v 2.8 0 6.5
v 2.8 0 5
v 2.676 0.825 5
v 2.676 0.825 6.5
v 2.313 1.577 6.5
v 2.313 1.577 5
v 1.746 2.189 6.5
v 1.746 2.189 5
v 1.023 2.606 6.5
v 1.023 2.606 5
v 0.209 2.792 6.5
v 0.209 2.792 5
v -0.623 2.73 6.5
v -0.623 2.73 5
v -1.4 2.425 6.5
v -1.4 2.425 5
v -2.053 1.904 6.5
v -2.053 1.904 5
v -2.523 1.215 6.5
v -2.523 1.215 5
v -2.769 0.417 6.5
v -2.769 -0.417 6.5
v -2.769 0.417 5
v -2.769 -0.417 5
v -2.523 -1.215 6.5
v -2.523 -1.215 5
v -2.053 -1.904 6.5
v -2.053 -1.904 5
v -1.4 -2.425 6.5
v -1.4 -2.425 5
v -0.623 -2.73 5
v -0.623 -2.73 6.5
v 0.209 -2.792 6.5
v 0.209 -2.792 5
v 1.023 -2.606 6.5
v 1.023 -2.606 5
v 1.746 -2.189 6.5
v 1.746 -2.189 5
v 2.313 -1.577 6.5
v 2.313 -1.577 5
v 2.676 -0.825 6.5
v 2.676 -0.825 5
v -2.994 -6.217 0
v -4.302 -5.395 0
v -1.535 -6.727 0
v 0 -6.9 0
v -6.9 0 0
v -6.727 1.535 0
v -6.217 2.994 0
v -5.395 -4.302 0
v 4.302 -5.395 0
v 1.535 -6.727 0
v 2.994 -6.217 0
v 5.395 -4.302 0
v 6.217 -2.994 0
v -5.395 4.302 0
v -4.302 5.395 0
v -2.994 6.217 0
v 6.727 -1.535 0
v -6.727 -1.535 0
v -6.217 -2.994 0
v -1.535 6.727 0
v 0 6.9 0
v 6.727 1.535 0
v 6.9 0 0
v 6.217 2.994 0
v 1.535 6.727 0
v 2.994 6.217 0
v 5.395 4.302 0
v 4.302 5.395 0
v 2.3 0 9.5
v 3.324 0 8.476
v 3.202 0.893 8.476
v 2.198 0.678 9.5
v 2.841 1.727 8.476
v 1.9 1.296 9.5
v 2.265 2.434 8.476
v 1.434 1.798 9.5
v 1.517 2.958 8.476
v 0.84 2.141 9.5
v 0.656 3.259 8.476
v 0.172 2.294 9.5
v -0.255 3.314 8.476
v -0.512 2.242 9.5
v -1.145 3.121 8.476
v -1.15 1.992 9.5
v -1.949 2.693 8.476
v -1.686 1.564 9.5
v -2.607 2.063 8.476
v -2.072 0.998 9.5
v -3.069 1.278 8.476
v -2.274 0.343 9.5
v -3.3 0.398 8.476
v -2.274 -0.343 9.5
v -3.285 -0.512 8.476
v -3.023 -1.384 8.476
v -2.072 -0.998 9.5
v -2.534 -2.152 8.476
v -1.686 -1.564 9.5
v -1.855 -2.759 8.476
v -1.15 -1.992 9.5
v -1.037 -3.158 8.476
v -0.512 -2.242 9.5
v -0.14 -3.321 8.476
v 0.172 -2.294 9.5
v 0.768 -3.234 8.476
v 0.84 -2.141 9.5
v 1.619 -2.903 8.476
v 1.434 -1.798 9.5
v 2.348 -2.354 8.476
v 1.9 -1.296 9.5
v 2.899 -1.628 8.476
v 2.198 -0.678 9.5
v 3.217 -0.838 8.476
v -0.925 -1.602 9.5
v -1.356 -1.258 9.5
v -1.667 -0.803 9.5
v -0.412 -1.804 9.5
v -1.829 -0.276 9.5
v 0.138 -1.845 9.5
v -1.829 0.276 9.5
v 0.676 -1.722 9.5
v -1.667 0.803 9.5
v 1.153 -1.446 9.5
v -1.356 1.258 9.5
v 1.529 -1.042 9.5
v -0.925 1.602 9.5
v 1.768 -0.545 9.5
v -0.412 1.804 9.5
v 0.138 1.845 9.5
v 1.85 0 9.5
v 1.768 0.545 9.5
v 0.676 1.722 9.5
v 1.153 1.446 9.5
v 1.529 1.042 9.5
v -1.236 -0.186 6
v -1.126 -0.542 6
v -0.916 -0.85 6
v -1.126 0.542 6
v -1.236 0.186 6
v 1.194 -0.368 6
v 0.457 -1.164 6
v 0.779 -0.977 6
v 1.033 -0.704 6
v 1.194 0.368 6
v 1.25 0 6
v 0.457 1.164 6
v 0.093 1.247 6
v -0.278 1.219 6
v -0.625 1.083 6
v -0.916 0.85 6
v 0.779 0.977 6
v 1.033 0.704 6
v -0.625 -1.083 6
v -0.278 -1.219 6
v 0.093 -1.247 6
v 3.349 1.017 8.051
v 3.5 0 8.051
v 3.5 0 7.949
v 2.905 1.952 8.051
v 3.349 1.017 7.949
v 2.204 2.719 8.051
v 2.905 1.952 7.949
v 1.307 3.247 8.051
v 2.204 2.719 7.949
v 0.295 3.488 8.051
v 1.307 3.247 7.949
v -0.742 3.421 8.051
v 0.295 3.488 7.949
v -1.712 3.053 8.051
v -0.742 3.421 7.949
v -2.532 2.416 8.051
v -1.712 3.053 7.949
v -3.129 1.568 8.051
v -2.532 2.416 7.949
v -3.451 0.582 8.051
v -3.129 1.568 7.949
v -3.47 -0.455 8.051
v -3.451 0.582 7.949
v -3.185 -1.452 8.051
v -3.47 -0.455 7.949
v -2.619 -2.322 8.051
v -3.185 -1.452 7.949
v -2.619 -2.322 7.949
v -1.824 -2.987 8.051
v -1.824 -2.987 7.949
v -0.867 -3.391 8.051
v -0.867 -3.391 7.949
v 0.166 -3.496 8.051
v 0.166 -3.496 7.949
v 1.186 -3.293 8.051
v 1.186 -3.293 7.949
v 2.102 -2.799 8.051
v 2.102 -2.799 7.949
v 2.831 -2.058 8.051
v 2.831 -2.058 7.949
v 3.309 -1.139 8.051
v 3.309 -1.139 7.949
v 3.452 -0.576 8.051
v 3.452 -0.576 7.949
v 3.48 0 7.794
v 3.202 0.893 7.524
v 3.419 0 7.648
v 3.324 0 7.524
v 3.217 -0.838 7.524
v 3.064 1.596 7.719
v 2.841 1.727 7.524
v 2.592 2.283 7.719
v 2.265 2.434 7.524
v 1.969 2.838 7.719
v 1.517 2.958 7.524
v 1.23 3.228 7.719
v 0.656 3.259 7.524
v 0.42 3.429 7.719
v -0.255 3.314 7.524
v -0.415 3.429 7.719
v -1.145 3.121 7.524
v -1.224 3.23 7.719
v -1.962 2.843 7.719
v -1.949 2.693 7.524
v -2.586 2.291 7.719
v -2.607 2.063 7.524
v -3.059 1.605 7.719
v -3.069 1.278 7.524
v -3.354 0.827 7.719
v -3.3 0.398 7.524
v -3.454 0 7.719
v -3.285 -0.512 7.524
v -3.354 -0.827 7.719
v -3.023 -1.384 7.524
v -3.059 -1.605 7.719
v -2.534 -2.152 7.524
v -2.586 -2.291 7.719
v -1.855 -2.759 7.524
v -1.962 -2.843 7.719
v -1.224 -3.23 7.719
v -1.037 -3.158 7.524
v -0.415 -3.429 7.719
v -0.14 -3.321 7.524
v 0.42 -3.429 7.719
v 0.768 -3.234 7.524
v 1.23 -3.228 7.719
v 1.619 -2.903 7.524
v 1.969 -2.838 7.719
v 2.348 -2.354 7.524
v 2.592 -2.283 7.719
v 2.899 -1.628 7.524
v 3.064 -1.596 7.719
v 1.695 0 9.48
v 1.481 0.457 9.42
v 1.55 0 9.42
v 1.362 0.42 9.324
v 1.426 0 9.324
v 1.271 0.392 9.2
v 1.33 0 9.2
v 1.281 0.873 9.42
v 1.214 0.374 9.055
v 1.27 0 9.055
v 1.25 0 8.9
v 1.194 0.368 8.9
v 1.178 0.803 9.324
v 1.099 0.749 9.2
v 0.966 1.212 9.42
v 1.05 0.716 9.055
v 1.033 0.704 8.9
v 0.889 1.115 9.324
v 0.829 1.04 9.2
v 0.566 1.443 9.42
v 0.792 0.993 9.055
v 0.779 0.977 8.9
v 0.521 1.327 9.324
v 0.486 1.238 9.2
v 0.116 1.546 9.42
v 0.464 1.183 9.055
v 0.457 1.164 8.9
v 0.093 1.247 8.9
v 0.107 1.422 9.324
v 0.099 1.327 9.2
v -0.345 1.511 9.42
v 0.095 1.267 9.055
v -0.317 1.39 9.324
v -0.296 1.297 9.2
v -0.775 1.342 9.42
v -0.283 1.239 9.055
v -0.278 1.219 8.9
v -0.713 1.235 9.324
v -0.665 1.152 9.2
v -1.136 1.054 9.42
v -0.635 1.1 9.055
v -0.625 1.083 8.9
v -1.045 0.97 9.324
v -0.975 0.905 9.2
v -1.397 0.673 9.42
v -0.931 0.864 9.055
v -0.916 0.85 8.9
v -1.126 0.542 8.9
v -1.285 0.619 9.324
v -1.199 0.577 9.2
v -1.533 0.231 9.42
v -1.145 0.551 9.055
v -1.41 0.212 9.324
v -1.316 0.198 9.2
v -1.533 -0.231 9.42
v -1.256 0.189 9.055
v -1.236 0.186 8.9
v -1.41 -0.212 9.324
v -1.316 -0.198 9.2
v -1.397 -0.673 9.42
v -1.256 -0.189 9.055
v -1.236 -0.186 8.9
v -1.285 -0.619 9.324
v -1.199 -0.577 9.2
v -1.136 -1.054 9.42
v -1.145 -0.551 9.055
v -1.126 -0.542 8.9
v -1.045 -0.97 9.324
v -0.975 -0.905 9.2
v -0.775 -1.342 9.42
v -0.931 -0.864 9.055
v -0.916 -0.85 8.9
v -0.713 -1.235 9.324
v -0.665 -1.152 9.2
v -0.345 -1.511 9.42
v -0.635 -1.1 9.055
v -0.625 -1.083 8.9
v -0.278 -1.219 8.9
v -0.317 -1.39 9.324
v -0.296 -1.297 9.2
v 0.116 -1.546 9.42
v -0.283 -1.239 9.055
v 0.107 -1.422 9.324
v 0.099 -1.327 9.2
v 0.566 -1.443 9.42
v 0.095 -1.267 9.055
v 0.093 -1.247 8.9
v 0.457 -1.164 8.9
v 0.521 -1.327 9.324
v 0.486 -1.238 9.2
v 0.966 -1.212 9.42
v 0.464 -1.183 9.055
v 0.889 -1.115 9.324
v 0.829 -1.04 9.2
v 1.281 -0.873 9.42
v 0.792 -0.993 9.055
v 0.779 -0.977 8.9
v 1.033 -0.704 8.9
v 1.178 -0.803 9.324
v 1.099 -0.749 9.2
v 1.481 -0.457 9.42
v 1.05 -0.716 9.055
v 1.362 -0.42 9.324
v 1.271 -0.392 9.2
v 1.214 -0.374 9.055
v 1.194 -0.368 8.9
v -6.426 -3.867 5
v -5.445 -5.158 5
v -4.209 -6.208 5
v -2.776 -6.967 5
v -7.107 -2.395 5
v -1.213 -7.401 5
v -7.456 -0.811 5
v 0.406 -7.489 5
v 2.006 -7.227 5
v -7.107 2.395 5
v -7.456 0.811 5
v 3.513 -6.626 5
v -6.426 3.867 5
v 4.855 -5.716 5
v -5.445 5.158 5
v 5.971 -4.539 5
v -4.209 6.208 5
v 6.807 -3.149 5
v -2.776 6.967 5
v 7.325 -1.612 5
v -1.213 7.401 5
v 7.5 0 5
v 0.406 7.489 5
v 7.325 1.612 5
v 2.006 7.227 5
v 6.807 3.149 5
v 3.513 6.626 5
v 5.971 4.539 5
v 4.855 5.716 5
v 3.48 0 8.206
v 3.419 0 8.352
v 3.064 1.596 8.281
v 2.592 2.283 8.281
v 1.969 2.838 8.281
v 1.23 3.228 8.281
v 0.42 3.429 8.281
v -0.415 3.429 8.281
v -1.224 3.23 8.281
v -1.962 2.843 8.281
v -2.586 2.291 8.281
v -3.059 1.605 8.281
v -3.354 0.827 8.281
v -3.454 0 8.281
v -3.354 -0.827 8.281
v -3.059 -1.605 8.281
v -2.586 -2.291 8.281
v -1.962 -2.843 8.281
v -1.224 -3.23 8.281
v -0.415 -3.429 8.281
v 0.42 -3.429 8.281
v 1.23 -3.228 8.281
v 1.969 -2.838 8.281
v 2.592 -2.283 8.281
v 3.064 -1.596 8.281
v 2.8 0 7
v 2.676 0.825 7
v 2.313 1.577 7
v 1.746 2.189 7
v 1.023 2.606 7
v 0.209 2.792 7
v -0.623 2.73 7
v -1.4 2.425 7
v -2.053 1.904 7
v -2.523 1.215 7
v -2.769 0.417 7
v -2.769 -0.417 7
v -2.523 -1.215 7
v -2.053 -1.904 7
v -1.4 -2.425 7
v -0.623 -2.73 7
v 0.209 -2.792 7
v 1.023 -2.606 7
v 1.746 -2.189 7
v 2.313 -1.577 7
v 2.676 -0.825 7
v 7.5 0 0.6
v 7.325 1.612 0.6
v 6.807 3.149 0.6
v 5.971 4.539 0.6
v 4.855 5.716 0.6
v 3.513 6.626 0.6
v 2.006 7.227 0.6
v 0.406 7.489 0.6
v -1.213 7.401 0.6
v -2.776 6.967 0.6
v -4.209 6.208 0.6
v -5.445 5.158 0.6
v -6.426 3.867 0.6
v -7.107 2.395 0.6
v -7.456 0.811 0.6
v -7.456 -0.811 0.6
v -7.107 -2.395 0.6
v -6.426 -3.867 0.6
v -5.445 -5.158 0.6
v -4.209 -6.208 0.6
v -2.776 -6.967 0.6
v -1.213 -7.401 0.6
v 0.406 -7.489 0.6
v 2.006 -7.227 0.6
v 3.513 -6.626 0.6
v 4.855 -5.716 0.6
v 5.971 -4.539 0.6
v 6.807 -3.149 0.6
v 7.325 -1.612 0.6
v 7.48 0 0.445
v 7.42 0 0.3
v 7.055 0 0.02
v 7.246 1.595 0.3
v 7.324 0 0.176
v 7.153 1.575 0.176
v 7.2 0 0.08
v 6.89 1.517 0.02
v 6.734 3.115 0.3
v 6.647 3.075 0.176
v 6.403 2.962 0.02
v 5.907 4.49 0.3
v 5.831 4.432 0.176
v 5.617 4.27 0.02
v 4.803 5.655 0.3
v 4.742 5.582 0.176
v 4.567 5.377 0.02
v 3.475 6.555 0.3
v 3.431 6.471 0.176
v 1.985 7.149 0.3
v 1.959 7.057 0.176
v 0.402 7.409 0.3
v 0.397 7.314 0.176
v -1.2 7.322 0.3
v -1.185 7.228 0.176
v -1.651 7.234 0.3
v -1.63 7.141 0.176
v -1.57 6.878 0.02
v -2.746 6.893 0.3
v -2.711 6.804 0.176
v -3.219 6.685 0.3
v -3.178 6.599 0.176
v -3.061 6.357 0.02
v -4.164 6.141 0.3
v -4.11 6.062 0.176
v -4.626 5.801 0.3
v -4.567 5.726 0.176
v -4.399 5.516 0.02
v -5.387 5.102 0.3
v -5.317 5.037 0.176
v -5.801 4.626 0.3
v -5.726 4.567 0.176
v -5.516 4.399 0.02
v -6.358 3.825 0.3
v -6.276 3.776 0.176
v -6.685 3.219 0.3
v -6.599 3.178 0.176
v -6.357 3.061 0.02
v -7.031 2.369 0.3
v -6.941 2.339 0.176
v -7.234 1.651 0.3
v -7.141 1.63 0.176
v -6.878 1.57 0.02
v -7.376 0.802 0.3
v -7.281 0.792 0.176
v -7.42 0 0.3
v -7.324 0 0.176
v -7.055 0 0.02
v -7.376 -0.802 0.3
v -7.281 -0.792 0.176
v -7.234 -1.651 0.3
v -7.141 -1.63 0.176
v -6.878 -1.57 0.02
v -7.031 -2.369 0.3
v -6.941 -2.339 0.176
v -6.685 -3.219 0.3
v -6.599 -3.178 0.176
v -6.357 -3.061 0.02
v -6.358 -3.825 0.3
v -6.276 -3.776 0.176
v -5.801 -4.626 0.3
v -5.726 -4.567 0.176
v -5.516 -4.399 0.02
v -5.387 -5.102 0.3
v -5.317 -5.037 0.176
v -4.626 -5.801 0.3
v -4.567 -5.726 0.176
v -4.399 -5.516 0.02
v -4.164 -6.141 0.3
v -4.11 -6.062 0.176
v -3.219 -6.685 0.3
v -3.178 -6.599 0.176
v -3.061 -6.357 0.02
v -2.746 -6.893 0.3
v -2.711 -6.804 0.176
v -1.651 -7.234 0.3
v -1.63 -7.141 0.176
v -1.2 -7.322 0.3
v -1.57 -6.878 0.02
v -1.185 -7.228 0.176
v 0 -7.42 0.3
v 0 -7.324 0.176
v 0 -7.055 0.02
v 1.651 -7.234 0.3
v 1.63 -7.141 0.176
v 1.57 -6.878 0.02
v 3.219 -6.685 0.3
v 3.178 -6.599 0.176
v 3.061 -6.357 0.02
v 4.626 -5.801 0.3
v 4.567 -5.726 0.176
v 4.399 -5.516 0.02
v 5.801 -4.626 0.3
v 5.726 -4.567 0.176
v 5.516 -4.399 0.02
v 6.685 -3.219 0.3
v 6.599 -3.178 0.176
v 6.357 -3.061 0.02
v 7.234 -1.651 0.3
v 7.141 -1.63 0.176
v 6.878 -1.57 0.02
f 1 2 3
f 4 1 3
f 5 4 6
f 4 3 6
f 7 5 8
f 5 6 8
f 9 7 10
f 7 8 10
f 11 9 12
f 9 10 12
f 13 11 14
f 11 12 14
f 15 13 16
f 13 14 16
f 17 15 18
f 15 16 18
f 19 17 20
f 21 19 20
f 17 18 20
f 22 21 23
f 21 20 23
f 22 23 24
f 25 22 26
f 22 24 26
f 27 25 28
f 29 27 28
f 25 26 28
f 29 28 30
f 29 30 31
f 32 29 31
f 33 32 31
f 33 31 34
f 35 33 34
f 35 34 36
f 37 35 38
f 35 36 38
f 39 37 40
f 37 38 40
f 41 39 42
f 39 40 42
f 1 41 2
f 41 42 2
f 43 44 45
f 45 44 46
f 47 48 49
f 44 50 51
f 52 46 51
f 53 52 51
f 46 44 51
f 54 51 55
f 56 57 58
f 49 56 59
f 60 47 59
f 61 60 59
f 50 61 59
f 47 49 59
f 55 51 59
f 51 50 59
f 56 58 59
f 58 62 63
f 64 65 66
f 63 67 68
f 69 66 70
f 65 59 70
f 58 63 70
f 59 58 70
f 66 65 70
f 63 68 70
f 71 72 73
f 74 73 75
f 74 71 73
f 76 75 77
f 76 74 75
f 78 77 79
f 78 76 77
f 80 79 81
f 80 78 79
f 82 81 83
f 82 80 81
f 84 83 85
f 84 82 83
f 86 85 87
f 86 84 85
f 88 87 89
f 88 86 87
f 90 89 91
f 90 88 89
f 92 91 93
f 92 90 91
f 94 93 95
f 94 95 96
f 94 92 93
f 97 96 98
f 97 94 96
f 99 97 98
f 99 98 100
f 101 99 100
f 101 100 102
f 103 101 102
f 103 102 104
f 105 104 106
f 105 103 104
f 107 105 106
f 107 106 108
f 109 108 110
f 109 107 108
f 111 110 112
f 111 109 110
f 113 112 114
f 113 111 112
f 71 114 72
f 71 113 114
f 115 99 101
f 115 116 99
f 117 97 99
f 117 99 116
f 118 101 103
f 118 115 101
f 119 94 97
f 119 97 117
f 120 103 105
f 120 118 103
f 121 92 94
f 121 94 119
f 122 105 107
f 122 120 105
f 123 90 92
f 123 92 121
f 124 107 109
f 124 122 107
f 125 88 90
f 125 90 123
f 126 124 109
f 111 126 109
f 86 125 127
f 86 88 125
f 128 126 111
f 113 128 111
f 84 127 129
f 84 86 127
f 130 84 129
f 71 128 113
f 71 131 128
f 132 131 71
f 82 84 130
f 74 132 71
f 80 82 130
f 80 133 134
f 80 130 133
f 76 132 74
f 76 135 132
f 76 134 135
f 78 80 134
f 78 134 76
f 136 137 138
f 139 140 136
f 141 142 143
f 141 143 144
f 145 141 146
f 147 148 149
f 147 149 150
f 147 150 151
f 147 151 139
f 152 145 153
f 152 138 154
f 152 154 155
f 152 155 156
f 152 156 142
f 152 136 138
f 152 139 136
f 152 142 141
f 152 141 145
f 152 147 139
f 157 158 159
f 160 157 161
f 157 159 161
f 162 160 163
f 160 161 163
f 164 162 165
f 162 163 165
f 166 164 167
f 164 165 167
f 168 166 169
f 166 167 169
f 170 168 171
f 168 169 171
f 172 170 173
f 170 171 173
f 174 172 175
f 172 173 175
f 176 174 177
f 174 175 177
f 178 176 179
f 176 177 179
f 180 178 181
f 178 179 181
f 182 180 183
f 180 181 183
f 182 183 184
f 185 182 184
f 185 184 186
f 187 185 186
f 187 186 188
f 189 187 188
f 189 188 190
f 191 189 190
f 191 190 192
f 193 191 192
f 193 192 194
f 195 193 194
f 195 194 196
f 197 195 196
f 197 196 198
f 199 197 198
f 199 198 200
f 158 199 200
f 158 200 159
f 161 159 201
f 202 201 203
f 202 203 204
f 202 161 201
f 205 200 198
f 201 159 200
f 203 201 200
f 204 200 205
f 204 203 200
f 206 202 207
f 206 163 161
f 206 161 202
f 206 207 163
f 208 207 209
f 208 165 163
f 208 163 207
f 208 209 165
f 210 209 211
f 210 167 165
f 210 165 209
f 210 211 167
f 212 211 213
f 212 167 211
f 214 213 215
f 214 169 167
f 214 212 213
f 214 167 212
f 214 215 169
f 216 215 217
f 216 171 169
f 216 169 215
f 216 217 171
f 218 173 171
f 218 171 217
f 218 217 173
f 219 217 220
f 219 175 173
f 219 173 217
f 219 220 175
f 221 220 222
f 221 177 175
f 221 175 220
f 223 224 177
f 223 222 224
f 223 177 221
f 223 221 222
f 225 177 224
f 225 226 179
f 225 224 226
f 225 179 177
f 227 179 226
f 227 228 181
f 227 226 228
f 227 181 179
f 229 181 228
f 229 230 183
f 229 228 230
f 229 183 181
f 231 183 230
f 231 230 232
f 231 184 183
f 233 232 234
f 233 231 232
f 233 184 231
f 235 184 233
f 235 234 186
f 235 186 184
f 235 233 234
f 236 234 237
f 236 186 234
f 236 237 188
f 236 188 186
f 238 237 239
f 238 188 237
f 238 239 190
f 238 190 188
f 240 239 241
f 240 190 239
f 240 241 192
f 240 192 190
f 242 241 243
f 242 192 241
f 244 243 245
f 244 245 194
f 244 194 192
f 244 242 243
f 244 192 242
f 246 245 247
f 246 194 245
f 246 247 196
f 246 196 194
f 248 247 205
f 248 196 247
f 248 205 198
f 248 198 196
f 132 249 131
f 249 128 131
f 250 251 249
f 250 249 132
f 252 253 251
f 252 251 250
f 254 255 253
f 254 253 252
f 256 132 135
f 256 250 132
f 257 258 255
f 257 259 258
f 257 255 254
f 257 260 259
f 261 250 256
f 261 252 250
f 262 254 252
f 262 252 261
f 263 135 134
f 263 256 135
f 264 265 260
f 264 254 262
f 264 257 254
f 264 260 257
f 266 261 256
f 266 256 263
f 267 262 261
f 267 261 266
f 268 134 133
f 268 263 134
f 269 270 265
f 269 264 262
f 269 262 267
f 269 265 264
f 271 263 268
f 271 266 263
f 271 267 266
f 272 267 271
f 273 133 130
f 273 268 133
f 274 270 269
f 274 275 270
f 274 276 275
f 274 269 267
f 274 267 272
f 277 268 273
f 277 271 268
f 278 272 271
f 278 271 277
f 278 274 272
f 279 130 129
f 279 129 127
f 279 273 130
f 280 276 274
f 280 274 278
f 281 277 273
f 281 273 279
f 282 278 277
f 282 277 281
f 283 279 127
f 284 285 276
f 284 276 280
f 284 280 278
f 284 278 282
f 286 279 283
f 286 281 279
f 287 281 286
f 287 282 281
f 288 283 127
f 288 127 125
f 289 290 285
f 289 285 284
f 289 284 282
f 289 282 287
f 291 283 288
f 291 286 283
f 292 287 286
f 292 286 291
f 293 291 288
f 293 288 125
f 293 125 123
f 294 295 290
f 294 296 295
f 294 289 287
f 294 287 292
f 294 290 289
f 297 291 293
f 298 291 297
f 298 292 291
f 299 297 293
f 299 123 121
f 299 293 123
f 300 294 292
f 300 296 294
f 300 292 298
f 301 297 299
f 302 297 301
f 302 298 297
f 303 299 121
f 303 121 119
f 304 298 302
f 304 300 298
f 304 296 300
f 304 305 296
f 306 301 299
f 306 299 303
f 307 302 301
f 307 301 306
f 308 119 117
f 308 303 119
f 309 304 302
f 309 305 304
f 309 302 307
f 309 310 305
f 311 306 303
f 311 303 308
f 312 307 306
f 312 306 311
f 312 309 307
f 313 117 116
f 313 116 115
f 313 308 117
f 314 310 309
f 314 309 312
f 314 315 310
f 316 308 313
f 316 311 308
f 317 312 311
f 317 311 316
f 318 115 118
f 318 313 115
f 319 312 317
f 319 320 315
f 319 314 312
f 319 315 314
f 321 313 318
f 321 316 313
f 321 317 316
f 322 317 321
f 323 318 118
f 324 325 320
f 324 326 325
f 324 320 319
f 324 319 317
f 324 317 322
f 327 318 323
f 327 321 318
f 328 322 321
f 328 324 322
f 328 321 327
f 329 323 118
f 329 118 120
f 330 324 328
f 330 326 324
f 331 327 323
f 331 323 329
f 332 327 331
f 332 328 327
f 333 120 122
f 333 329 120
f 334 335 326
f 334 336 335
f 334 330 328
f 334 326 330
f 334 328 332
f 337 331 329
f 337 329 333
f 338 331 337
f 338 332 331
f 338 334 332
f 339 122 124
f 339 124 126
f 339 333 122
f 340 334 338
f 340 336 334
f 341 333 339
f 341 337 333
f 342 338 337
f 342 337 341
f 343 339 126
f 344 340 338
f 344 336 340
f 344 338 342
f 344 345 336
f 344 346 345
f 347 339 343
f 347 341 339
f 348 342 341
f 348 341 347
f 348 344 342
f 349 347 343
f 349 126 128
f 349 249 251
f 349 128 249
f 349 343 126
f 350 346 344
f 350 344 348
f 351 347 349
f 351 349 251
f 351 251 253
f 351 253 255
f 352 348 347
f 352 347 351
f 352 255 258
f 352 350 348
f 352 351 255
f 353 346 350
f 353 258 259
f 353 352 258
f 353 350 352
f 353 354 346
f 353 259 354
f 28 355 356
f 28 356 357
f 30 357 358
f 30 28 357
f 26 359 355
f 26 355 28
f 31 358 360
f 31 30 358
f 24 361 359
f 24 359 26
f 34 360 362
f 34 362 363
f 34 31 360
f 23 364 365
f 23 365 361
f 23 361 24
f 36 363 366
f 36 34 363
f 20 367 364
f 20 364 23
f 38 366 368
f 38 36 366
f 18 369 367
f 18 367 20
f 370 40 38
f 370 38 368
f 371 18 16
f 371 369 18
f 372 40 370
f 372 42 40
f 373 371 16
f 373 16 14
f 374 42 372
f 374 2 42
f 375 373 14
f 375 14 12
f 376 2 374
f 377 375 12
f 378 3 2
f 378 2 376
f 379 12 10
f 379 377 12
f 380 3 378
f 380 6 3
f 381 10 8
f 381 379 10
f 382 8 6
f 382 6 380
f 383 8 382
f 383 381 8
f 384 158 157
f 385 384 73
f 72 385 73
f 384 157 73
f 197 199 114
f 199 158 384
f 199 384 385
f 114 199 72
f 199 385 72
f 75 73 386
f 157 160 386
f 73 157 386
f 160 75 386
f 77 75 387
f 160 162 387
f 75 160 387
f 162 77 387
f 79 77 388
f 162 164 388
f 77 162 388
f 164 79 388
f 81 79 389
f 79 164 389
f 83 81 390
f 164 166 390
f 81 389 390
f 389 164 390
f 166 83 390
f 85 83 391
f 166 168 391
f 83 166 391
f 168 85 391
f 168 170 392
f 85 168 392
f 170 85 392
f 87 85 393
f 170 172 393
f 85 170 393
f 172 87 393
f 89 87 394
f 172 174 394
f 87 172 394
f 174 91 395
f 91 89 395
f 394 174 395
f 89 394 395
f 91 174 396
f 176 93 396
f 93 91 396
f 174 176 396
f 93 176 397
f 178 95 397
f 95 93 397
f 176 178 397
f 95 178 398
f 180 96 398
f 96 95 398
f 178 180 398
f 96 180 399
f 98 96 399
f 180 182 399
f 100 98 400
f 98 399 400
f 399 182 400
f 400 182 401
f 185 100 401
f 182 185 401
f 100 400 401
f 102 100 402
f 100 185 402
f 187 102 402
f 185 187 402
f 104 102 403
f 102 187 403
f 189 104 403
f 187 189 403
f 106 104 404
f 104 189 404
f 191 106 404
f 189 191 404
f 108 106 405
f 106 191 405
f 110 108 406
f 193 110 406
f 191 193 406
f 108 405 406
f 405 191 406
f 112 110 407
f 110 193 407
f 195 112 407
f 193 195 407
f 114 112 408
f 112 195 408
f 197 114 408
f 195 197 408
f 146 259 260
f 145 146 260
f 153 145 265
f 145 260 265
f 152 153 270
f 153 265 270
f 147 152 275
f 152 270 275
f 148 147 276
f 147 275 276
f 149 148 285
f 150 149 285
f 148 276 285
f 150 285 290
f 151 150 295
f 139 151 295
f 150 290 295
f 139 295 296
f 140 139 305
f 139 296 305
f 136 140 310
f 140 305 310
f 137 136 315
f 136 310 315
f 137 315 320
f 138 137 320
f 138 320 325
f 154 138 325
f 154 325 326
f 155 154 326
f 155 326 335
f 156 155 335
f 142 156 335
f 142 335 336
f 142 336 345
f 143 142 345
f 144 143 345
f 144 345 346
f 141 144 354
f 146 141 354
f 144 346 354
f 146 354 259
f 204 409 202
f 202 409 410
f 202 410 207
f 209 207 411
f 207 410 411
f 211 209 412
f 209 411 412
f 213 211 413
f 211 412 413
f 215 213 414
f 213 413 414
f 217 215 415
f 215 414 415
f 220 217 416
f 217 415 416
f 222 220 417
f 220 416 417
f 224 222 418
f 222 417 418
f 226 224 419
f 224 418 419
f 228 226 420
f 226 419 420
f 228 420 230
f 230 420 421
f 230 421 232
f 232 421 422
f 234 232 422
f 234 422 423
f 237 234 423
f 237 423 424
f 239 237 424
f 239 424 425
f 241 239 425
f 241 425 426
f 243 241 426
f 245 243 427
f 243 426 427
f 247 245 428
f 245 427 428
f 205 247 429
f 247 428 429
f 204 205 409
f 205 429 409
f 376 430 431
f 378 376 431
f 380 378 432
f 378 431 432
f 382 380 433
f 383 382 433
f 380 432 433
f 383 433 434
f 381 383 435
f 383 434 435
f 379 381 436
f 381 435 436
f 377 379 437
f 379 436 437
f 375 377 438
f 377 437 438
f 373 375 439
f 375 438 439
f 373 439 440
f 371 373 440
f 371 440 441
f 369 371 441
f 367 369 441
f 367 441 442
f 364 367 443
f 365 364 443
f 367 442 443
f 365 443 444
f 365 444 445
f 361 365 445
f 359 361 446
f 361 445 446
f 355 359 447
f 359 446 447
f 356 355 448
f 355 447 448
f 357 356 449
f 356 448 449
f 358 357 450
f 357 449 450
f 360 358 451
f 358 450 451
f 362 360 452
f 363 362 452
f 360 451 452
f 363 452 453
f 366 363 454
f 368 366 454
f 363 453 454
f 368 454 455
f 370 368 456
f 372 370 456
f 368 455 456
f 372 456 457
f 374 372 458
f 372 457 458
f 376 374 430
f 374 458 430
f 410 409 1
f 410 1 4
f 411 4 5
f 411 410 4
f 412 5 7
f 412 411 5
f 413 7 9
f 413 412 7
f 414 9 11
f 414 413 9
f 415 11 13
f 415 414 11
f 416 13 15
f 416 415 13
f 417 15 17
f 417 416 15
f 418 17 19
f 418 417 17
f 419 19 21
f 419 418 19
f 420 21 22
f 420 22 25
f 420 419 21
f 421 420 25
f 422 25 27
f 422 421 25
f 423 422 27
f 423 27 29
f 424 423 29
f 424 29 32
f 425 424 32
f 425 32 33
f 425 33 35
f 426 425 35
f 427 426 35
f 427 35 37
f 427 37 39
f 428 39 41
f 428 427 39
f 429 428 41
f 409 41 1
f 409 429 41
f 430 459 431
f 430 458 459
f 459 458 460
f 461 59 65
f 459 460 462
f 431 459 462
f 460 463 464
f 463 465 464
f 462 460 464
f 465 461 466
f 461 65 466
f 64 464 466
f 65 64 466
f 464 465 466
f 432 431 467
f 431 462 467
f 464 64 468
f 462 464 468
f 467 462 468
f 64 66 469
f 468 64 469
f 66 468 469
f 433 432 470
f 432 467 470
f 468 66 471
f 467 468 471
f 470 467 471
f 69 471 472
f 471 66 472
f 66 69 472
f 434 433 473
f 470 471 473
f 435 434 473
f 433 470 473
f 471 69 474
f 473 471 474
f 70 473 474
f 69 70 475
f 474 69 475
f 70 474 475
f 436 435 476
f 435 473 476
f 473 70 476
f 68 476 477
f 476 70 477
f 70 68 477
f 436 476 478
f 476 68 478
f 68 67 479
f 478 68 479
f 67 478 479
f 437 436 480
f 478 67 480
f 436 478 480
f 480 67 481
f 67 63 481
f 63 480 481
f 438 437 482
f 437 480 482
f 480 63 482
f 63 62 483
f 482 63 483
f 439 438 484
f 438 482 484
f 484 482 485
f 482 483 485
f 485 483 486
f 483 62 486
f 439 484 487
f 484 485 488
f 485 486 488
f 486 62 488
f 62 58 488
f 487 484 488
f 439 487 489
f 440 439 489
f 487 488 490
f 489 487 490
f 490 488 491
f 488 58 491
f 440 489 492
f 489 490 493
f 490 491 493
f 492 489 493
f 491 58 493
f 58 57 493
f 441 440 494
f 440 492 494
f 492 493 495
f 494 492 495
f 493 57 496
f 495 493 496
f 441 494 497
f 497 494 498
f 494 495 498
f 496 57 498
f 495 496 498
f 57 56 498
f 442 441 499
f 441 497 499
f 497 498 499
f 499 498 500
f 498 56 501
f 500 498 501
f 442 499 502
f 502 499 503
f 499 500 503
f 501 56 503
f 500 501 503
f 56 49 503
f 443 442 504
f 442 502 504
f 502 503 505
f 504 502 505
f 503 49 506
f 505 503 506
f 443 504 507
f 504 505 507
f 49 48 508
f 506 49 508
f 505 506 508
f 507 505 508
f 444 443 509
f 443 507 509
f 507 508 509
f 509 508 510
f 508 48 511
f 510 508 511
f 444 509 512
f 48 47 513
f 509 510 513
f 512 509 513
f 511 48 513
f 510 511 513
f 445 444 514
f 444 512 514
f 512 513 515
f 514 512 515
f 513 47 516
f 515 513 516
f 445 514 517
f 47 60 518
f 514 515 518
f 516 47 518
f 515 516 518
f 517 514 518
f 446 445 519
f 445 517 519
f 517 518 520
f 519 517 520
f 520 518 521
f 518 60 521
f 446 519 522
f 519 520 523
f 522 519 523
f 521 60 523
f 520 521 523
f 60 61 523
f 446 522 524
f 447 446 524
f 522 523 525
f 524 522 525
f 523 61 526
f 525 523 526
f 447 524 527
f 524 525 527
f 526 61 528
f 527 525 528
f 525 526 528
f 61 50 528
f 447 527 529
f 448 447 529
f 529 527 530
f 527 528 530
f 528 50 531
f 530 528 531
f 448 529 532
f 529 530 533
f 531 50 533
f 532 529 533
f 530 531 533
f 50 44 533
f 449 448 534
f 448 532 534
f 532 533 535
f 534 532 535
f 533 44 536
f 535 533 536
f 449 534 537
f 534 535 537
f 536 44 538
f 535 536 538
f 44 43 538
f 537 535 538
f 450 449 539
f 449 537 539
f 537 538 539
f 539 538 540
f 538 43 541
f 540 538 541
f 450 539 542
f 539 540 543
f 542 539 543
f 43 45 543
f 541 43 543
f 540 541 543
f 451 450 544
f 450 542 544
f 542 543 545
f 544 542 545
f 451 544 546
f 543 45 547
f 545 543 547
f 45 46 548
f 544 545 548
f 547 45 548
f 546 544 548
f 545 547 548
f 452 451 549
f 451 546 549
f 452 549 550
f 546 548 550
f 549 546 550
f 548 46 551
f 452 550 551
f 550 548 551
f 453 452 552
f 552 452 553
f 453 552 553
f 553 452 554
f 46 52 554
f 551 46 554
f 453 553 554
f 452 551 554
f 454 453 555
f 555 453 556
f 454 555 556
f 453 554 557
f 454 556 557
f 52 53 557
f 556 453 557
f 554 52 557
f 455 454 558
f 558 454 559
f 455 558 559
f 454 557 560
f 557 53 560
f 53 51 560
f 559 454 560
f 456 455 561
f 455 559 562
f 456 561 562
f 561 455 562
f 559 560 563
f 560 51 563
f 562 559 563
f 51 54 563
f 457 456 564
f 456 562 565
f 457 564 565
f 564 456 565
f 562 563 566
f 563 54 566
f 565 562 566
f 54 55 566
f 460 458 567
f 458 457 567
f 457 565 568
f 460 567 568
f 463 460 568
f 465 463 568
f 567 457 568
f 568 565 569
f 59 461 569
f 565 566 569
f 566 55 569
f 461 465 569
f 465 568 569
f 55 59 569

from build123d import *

# Parameters (mm, degrees)
F0_R        = 7.5
F1_DEPTH    = 5
F2_R        = 2.8
F3_DEPTH    = 1.5
F4_R        = 3.5
F5_DEPTH    = 3
F6_S5_R     = 2.8
F6_T6_DEPTH = 6
F7_R        = 1.25
F8_DEPTH    = 3.5
F9_R        = 0.6


# Not quite as in the source:
# - a fillet or chamfer that OpenCascade refuses, or shapes differently, is made with other operations: its cross-section is extruded or revolved along the edge and cut away or added
# - two fillets or chamfers of one size are made in one step


with BuildPart() as f1:
    # F0 (on Top) → F1 (new body)
    with BuildSketch(Plane.XY):
        Circle(F0_R)
    extrude(amount=F1_DEPTH)

    # F2 (on face) → F3 (join)
    with BuildSketch(Plane.XY.offset(5)):
        Circle(F2_R)
    extrude(amount=F3_DEPTH)

    # F4 (on face) → F5 (join)
    with BuildSketch(Plane.XY.offset(6.5)):
        Circle(F4_R)
    extrude(amount=F5_DEPTH)

    # F6: chamfer of 1.2 on 2 edges, made by hand


with BuildPart() as f6_tool2:
    # F6_s3 → F6_t4 (revolve)
    with BuildSketch(Plane.XZ):
        Polygon((3.5, 7.7), (2.3, 6.5), (3.5, 6.5), align=None)
    revolve(axis=Axis((0, 0, 6.5), (0, 0, 1)))

    # F6_s5 → F6_t6 (cut, symmetric)
    with BuildSketch(Plane.XY.offset(7.1)):
        Circle(F6_S5_R)
    extrude(amount=F6_T6_DEPTH, both=True, mode=Mode.SUBTRACT)


with BuildPart() as f1_1:
    add(f1.part)

    # F6_t1: cut F6_tool2
    add(f6_tool2.part, mode=Mode.SUBTRACT)

    # F6_s7 → F6_t8 (revolve, cut)
    with BuildSketch(Plane.XZ):
        Polygon((3.5, 8.3), (2.3, 9.5), (3.5, 9.5), align=None)
    revolve(axis=Axis((0, 0, 9.5), (0, 0, 1)), mode=Mode.SUBTRACT)

    # F7 (on face) → F8 (cut)
    with BuildSketch(Plane.XY.offset(9.5)):
        Circle(F7_R)
    extrude(amount=-F8_DEPTH, mode=Mode.SUBTRACT)

    # F9
    f9_edges = [f1_1.edges().sort_by_distance(p)[0] for p in [
        (-1.25, 0, 9.5),
        (-3.5, 0, 8.3),
        (-3.5, 0, 7.7),
        (-7.5, 0, 0),
    ]]
    fillet(f9_edges, radius=F9_R)


solid = f1_1.part
